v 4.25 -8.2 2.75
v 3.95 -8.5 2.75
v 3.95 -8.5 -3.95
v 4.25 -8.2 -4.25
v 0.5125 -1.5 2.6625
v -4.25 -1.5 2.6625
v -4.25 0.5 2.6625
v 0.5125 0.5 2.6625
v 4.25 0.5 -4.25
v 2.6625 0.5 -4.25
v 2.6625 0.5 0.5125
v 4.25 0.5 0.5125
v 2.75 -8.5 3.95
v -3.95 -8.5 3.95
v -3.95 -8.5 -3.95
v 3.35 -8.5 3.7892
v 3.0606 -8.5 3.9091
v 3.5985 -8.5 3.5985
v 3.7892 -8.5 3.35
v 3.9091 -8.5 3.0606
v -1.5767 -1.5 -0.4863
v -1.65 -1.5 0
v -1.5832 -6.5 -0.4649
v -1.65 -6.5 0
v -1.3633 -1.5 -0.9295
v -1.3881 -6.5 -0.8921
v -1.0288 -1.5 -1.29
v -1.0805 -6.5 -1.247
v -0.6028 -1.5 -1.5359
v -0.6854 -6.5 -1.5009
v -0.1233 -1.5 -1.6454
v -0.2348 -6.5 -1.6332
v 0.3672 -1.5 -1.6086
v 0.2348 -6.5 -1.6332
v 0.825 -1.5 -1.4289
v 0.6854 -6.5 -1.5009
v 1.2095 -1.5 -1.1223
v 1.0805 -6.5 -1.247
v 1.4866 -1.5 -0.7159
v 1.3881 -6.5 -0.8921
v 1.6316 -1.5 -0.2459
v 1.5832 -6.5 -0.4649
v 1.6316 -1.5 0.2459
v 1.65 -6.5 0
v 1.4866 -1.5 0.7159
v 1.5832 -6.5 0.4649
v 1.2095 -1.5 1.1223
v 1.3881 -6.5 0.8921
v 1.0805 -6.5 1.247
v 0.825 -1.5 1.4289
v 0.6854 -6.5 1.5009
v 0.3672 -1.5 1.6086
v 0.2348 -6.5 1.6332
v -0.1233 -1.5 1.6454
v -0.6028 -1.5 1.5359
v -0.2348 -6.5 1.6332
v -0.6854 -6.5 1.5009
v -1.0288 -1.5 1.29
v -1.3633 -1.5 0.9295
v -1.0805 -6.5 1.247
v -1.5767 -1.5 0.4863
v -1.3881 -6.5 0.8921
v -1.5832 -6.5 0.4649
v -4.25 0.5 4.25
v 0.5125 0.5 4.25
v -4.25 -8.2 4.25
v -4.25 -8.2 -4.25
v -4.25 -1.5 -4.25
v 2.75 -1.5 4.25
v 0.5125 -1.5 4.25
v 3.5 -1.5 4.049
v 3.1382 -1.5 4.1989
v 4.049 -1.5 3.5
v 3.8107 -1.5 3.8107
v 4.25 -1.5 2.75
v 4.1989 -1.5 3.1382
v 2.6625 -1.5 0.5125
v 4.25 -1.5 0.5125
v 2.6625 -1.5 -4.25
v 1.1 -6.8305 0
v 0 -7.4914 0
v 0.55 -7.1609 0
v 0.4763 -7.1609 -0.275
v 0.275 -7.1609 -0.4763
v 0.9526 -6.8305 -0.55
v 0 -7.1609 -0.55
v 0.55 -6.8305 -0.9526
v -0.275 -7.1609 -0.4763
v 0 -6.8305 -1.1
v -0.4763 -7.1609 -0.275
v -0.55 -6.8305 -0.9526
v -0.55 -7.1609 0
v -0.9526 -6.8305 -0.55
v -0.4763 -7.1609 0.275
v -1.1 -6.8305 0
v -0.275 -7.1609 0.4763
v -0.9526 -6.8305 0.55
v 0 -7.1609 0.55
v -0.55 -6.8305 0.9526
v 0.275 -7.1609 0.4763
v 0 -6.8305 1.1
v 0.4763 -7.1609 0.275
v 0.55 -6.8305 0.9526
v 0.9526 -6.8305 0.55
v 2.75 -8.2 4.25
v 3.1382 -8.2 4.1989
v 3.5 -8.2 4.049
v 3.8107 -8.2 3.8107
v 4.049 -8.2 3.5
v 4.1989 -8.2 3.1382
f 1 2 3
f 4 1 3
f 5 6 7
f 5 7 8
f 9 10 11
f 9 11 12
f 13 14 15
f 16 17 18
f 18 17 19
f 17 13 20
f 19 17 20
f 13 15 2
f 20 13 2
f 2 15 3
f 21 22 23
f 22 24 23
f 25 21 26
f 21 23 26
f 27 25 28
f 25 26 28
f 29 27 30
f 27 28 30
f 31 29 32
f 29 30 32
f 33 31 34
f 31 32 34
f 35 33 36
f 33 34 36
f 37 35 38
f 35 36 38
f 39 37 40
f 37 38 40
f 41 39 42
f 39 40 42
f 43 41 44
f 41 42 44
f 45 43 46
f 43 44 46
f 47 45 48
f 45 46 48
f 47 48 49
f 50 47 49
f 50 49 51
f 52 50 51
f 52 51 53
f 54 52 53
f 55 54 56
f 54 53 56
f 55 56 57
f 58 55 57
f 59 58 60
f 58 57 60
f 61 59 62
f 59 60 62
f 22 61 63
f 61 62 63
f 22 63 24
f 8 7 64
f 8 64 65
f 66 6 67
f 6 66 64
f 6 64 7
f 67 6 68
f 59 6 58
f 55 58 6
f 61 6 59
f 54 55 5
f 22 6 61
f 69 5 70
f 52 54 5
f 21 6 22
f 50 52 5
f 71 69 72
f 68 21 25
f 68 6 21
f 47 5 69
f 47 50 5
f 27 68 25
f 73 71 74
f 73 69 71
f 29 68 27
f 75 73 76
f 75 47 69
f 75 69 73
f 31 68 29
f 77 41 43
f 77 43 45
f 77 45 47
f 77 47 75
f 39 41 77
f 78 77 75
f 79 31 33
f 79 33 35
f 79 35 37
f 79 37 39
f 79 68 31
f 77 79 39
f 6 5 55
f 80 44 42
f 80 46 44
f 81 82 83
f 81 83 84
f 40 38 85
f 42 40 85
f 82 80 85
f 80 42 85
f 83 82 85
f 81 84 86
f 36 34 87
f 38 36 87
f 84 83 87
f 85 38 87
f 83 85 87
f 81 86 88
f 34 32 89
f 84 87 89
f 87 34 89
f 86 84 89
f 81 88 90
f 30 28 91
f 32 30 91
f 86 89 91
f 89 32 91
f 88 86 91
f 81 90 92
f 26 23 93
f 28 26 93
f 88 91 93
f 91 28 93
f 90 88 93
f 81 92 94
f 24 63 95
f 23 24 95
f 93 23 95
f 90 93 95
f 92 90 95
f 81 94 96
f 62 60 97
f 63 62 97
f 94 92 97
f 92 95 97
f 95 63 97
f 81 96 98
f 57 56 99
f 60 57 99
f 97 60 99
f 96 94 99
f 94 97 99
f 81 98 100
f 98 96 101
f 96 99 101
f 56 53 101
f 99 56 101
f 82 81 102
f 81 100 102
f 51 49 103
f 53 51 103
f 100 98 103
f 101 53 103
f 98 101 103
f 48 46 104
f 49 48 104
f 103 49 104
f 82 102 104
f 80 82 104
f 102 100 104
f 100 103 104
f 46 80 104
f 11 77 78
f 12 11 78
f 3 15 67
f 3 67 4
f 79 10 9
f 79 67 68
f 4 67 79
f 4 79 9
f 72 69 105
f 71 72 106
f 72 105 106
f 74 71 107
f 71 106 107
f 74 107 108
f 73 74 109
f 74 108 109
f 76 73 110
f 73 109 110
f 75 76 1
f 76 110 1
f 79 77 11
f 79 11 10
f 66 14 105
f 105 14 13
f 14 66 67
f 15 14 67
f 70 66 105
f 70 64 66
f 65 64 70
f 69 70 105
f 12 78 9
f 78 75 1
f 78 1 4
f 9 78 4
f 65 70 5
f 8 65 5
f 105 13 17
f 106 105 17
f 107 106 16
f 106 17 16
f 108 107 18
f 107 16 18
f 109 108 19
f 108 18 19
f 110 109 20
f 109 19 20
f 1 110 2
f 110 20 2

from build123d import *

# Parameters (mm, degrees)
BASE_W                = 8.5
BASE_H                = 8.5
BOSS_EXTRUDE1_DEPTH   = 8.5
CUTOUT_W              = 7
CUTOUT_H              = 7
CUT_EXTRUDE1_DEPTH    = 1.5
SKETCH3_W             = 1.5
SKETCH3_H             = 1.5
CUT_EXTRUDE2_DEPTH    = 12.803071634
FILLET3_R             = 0.508
FILLET4_R             = 1.5
M4_TAPPED_HOLE1_D     = 3.3
M4_TAPPED_HOLE1_DEPTH = 5
M4_TAPPED_HOLE1_TIP   = 0.991420021
CUT_EXTRUDE3_START    = -1.5
CUT_EXTRUDE3_DEPTH    = 1.5
CHAMFER1_SIZE         = 0.3
SKETCH15_W            = 1.5875
SKETCH15_H            = 4.7625
SKETCH15_W_2          = 4.7625
SKETCH15_H_2          = 1.5875
BOSS_EXTRUDE2_DEPTH   = 2


with BuildPart() as part:
    # Base → Boss-Extrude1 (new body)
    with BuildSketch(Plane(origin=(0, 0, 0), x_dir=(1, 0, 0), z_dir=(0, 1, 0))):
        Rectangle(BASE_W, BASE_H)
    extrude(amount=-BOSS_EXTRUDE1_DEPTH)

    # Cutout → Cut-Extrude1 (cut)
    with BuildSketch(Plane(origin=(0, 0, 0), x_dir=(1, 0, 0), z_dir=(0, 1, 0))):
        with Locations((-0.75, 0.75)):
            Rectangle(CUTOUT_W, CUTOUT_H)
    extrude(amount=-CUT_EXTRUDE1_DEPTH, mode=Mode.SUBTRACT)

    # Sketch3 → Cut-Extrude2 (cut, through all)
    with BuildSketch(Plane.ZY.offset(-2.75)):
        with Locations((-3.5, -0.75)):
            Rectangle(SKETCH3_W, SKETCH3_H)
    cut_extrude2 = extrude(amount=-CUT_EXTRUDE2_DEPTH, mode=Mode.SUBTRACT)

    # Mirror1: Cut-Extrude2 across plane
    add(cut_extrude2.mirror(Plane(origin=(0, 0, 0), x_dir=(0.7071067811865476, 0, 0.7071067811865475), z_dir=(0.7071067811865475, 0, -0.7071067811865476))), mode=Mode.SUBTRACT)

    # Fillet3
    fillet3_edges = [part.edges().sort_by_distance(p)[0] for p in [
        (2.75, -0.75, 2.75),
    ]]
    fillet(fillet3_edges, radius=FILLET3_R)

    # Fillet4
    fillet4_edges = [part.edges().sort_by_distance(p)[0] for p in [
        (4.25, -4.25, 4.25),
    ]]
    fillet(fillet4_edges, radius=FILLET4_R)

    # M4 Tapped Hole1
    with Locations(Plane(origin=(0, -1.5, 0), x_dir=(1, 0, 0), z_dir=(0, 1, 0))):
        with Locations((0, 0)):
            Hole(M4_TAPPED_HOLE1_D / 2, depth=M4_TAPPED_HOLE1_DEPTH)
            with Locations((0, 0, -(M4_TAPPED_HOLE1_DEPTH + M4_TAPPED_HOLE1_TIP / 2))):  # 118° drill point
                Cone(0, M4_TAPPED_HOLE1_D / 2, M4_TAPPED_HOLE1_TIP, mode=Mode.SUBTRACT)

    # Sketch14 → Cut-Extrude3 (cut)
    with BuildSketch(Plane(origin=(0, 0, 0), x_dir=(1, 0, 0), z_dir=(0, 1, 0)).offset(CUT_EXTRUDE3_START)):
        with BuildLine():
            Line((-2.75, -4.25), (2.75, -4.25))
            ThreePointArc((2.75, -4.25), (3.810660172, -3.810660172), (4.25, -2.75))
            Line((4.25, -2.75), (4.25, 2.75))
            Line((4.25, 2.75), (2.75, 2.75))
            Line((2.75, 2.75), (2.75, -2.242))
            ThreePointArc((2.75, -2.242), (2.601210245, -2.601210245), (2.242, -2.75))
            Line((2.242, -2.75), (-2.75, -2.75))
            Line((-2.75, -2.75), (-2.75, -4.25))
        make_face()
    extrude(amount=CUT_EXTRUDE3_DEPTH, mode=Mode.SUBTRACT)

    # Chamfer1
    chamfer1_edges = [part.edges().sort_by_distance(p)[0] for p in [
        (-4.25, -8.5, 0),
        (-0.75, -8.5, 4.25),
        (4.25, -8.5, -0.75),
        (3.810660172, -8.5, 3.810660172),
        (0, -8.5, -4.25),
    ]]
    chamfer(chamfer1_edges, length=CHAMFER1_SIZE)

    # Sketch15 → Boss-Extrude2 (add)
    with BuildSketch(Plane(origin=(0, -1.5, 0), x_dir=(1, 0, 0), z_dir=(0, 1, 0))):
        with Locations((3.45625, 1.86875)):
            Rectangle(SKETCH15_W, SKETCH15_H)
        with Locations((-1.86875, -3.45625)):
            Rectangle(SKETCH15_W_2, SKETCH15_H_2)
    extrude(amount=BOSS_EXTRUDE2_DEPTH)


solid = part.part
